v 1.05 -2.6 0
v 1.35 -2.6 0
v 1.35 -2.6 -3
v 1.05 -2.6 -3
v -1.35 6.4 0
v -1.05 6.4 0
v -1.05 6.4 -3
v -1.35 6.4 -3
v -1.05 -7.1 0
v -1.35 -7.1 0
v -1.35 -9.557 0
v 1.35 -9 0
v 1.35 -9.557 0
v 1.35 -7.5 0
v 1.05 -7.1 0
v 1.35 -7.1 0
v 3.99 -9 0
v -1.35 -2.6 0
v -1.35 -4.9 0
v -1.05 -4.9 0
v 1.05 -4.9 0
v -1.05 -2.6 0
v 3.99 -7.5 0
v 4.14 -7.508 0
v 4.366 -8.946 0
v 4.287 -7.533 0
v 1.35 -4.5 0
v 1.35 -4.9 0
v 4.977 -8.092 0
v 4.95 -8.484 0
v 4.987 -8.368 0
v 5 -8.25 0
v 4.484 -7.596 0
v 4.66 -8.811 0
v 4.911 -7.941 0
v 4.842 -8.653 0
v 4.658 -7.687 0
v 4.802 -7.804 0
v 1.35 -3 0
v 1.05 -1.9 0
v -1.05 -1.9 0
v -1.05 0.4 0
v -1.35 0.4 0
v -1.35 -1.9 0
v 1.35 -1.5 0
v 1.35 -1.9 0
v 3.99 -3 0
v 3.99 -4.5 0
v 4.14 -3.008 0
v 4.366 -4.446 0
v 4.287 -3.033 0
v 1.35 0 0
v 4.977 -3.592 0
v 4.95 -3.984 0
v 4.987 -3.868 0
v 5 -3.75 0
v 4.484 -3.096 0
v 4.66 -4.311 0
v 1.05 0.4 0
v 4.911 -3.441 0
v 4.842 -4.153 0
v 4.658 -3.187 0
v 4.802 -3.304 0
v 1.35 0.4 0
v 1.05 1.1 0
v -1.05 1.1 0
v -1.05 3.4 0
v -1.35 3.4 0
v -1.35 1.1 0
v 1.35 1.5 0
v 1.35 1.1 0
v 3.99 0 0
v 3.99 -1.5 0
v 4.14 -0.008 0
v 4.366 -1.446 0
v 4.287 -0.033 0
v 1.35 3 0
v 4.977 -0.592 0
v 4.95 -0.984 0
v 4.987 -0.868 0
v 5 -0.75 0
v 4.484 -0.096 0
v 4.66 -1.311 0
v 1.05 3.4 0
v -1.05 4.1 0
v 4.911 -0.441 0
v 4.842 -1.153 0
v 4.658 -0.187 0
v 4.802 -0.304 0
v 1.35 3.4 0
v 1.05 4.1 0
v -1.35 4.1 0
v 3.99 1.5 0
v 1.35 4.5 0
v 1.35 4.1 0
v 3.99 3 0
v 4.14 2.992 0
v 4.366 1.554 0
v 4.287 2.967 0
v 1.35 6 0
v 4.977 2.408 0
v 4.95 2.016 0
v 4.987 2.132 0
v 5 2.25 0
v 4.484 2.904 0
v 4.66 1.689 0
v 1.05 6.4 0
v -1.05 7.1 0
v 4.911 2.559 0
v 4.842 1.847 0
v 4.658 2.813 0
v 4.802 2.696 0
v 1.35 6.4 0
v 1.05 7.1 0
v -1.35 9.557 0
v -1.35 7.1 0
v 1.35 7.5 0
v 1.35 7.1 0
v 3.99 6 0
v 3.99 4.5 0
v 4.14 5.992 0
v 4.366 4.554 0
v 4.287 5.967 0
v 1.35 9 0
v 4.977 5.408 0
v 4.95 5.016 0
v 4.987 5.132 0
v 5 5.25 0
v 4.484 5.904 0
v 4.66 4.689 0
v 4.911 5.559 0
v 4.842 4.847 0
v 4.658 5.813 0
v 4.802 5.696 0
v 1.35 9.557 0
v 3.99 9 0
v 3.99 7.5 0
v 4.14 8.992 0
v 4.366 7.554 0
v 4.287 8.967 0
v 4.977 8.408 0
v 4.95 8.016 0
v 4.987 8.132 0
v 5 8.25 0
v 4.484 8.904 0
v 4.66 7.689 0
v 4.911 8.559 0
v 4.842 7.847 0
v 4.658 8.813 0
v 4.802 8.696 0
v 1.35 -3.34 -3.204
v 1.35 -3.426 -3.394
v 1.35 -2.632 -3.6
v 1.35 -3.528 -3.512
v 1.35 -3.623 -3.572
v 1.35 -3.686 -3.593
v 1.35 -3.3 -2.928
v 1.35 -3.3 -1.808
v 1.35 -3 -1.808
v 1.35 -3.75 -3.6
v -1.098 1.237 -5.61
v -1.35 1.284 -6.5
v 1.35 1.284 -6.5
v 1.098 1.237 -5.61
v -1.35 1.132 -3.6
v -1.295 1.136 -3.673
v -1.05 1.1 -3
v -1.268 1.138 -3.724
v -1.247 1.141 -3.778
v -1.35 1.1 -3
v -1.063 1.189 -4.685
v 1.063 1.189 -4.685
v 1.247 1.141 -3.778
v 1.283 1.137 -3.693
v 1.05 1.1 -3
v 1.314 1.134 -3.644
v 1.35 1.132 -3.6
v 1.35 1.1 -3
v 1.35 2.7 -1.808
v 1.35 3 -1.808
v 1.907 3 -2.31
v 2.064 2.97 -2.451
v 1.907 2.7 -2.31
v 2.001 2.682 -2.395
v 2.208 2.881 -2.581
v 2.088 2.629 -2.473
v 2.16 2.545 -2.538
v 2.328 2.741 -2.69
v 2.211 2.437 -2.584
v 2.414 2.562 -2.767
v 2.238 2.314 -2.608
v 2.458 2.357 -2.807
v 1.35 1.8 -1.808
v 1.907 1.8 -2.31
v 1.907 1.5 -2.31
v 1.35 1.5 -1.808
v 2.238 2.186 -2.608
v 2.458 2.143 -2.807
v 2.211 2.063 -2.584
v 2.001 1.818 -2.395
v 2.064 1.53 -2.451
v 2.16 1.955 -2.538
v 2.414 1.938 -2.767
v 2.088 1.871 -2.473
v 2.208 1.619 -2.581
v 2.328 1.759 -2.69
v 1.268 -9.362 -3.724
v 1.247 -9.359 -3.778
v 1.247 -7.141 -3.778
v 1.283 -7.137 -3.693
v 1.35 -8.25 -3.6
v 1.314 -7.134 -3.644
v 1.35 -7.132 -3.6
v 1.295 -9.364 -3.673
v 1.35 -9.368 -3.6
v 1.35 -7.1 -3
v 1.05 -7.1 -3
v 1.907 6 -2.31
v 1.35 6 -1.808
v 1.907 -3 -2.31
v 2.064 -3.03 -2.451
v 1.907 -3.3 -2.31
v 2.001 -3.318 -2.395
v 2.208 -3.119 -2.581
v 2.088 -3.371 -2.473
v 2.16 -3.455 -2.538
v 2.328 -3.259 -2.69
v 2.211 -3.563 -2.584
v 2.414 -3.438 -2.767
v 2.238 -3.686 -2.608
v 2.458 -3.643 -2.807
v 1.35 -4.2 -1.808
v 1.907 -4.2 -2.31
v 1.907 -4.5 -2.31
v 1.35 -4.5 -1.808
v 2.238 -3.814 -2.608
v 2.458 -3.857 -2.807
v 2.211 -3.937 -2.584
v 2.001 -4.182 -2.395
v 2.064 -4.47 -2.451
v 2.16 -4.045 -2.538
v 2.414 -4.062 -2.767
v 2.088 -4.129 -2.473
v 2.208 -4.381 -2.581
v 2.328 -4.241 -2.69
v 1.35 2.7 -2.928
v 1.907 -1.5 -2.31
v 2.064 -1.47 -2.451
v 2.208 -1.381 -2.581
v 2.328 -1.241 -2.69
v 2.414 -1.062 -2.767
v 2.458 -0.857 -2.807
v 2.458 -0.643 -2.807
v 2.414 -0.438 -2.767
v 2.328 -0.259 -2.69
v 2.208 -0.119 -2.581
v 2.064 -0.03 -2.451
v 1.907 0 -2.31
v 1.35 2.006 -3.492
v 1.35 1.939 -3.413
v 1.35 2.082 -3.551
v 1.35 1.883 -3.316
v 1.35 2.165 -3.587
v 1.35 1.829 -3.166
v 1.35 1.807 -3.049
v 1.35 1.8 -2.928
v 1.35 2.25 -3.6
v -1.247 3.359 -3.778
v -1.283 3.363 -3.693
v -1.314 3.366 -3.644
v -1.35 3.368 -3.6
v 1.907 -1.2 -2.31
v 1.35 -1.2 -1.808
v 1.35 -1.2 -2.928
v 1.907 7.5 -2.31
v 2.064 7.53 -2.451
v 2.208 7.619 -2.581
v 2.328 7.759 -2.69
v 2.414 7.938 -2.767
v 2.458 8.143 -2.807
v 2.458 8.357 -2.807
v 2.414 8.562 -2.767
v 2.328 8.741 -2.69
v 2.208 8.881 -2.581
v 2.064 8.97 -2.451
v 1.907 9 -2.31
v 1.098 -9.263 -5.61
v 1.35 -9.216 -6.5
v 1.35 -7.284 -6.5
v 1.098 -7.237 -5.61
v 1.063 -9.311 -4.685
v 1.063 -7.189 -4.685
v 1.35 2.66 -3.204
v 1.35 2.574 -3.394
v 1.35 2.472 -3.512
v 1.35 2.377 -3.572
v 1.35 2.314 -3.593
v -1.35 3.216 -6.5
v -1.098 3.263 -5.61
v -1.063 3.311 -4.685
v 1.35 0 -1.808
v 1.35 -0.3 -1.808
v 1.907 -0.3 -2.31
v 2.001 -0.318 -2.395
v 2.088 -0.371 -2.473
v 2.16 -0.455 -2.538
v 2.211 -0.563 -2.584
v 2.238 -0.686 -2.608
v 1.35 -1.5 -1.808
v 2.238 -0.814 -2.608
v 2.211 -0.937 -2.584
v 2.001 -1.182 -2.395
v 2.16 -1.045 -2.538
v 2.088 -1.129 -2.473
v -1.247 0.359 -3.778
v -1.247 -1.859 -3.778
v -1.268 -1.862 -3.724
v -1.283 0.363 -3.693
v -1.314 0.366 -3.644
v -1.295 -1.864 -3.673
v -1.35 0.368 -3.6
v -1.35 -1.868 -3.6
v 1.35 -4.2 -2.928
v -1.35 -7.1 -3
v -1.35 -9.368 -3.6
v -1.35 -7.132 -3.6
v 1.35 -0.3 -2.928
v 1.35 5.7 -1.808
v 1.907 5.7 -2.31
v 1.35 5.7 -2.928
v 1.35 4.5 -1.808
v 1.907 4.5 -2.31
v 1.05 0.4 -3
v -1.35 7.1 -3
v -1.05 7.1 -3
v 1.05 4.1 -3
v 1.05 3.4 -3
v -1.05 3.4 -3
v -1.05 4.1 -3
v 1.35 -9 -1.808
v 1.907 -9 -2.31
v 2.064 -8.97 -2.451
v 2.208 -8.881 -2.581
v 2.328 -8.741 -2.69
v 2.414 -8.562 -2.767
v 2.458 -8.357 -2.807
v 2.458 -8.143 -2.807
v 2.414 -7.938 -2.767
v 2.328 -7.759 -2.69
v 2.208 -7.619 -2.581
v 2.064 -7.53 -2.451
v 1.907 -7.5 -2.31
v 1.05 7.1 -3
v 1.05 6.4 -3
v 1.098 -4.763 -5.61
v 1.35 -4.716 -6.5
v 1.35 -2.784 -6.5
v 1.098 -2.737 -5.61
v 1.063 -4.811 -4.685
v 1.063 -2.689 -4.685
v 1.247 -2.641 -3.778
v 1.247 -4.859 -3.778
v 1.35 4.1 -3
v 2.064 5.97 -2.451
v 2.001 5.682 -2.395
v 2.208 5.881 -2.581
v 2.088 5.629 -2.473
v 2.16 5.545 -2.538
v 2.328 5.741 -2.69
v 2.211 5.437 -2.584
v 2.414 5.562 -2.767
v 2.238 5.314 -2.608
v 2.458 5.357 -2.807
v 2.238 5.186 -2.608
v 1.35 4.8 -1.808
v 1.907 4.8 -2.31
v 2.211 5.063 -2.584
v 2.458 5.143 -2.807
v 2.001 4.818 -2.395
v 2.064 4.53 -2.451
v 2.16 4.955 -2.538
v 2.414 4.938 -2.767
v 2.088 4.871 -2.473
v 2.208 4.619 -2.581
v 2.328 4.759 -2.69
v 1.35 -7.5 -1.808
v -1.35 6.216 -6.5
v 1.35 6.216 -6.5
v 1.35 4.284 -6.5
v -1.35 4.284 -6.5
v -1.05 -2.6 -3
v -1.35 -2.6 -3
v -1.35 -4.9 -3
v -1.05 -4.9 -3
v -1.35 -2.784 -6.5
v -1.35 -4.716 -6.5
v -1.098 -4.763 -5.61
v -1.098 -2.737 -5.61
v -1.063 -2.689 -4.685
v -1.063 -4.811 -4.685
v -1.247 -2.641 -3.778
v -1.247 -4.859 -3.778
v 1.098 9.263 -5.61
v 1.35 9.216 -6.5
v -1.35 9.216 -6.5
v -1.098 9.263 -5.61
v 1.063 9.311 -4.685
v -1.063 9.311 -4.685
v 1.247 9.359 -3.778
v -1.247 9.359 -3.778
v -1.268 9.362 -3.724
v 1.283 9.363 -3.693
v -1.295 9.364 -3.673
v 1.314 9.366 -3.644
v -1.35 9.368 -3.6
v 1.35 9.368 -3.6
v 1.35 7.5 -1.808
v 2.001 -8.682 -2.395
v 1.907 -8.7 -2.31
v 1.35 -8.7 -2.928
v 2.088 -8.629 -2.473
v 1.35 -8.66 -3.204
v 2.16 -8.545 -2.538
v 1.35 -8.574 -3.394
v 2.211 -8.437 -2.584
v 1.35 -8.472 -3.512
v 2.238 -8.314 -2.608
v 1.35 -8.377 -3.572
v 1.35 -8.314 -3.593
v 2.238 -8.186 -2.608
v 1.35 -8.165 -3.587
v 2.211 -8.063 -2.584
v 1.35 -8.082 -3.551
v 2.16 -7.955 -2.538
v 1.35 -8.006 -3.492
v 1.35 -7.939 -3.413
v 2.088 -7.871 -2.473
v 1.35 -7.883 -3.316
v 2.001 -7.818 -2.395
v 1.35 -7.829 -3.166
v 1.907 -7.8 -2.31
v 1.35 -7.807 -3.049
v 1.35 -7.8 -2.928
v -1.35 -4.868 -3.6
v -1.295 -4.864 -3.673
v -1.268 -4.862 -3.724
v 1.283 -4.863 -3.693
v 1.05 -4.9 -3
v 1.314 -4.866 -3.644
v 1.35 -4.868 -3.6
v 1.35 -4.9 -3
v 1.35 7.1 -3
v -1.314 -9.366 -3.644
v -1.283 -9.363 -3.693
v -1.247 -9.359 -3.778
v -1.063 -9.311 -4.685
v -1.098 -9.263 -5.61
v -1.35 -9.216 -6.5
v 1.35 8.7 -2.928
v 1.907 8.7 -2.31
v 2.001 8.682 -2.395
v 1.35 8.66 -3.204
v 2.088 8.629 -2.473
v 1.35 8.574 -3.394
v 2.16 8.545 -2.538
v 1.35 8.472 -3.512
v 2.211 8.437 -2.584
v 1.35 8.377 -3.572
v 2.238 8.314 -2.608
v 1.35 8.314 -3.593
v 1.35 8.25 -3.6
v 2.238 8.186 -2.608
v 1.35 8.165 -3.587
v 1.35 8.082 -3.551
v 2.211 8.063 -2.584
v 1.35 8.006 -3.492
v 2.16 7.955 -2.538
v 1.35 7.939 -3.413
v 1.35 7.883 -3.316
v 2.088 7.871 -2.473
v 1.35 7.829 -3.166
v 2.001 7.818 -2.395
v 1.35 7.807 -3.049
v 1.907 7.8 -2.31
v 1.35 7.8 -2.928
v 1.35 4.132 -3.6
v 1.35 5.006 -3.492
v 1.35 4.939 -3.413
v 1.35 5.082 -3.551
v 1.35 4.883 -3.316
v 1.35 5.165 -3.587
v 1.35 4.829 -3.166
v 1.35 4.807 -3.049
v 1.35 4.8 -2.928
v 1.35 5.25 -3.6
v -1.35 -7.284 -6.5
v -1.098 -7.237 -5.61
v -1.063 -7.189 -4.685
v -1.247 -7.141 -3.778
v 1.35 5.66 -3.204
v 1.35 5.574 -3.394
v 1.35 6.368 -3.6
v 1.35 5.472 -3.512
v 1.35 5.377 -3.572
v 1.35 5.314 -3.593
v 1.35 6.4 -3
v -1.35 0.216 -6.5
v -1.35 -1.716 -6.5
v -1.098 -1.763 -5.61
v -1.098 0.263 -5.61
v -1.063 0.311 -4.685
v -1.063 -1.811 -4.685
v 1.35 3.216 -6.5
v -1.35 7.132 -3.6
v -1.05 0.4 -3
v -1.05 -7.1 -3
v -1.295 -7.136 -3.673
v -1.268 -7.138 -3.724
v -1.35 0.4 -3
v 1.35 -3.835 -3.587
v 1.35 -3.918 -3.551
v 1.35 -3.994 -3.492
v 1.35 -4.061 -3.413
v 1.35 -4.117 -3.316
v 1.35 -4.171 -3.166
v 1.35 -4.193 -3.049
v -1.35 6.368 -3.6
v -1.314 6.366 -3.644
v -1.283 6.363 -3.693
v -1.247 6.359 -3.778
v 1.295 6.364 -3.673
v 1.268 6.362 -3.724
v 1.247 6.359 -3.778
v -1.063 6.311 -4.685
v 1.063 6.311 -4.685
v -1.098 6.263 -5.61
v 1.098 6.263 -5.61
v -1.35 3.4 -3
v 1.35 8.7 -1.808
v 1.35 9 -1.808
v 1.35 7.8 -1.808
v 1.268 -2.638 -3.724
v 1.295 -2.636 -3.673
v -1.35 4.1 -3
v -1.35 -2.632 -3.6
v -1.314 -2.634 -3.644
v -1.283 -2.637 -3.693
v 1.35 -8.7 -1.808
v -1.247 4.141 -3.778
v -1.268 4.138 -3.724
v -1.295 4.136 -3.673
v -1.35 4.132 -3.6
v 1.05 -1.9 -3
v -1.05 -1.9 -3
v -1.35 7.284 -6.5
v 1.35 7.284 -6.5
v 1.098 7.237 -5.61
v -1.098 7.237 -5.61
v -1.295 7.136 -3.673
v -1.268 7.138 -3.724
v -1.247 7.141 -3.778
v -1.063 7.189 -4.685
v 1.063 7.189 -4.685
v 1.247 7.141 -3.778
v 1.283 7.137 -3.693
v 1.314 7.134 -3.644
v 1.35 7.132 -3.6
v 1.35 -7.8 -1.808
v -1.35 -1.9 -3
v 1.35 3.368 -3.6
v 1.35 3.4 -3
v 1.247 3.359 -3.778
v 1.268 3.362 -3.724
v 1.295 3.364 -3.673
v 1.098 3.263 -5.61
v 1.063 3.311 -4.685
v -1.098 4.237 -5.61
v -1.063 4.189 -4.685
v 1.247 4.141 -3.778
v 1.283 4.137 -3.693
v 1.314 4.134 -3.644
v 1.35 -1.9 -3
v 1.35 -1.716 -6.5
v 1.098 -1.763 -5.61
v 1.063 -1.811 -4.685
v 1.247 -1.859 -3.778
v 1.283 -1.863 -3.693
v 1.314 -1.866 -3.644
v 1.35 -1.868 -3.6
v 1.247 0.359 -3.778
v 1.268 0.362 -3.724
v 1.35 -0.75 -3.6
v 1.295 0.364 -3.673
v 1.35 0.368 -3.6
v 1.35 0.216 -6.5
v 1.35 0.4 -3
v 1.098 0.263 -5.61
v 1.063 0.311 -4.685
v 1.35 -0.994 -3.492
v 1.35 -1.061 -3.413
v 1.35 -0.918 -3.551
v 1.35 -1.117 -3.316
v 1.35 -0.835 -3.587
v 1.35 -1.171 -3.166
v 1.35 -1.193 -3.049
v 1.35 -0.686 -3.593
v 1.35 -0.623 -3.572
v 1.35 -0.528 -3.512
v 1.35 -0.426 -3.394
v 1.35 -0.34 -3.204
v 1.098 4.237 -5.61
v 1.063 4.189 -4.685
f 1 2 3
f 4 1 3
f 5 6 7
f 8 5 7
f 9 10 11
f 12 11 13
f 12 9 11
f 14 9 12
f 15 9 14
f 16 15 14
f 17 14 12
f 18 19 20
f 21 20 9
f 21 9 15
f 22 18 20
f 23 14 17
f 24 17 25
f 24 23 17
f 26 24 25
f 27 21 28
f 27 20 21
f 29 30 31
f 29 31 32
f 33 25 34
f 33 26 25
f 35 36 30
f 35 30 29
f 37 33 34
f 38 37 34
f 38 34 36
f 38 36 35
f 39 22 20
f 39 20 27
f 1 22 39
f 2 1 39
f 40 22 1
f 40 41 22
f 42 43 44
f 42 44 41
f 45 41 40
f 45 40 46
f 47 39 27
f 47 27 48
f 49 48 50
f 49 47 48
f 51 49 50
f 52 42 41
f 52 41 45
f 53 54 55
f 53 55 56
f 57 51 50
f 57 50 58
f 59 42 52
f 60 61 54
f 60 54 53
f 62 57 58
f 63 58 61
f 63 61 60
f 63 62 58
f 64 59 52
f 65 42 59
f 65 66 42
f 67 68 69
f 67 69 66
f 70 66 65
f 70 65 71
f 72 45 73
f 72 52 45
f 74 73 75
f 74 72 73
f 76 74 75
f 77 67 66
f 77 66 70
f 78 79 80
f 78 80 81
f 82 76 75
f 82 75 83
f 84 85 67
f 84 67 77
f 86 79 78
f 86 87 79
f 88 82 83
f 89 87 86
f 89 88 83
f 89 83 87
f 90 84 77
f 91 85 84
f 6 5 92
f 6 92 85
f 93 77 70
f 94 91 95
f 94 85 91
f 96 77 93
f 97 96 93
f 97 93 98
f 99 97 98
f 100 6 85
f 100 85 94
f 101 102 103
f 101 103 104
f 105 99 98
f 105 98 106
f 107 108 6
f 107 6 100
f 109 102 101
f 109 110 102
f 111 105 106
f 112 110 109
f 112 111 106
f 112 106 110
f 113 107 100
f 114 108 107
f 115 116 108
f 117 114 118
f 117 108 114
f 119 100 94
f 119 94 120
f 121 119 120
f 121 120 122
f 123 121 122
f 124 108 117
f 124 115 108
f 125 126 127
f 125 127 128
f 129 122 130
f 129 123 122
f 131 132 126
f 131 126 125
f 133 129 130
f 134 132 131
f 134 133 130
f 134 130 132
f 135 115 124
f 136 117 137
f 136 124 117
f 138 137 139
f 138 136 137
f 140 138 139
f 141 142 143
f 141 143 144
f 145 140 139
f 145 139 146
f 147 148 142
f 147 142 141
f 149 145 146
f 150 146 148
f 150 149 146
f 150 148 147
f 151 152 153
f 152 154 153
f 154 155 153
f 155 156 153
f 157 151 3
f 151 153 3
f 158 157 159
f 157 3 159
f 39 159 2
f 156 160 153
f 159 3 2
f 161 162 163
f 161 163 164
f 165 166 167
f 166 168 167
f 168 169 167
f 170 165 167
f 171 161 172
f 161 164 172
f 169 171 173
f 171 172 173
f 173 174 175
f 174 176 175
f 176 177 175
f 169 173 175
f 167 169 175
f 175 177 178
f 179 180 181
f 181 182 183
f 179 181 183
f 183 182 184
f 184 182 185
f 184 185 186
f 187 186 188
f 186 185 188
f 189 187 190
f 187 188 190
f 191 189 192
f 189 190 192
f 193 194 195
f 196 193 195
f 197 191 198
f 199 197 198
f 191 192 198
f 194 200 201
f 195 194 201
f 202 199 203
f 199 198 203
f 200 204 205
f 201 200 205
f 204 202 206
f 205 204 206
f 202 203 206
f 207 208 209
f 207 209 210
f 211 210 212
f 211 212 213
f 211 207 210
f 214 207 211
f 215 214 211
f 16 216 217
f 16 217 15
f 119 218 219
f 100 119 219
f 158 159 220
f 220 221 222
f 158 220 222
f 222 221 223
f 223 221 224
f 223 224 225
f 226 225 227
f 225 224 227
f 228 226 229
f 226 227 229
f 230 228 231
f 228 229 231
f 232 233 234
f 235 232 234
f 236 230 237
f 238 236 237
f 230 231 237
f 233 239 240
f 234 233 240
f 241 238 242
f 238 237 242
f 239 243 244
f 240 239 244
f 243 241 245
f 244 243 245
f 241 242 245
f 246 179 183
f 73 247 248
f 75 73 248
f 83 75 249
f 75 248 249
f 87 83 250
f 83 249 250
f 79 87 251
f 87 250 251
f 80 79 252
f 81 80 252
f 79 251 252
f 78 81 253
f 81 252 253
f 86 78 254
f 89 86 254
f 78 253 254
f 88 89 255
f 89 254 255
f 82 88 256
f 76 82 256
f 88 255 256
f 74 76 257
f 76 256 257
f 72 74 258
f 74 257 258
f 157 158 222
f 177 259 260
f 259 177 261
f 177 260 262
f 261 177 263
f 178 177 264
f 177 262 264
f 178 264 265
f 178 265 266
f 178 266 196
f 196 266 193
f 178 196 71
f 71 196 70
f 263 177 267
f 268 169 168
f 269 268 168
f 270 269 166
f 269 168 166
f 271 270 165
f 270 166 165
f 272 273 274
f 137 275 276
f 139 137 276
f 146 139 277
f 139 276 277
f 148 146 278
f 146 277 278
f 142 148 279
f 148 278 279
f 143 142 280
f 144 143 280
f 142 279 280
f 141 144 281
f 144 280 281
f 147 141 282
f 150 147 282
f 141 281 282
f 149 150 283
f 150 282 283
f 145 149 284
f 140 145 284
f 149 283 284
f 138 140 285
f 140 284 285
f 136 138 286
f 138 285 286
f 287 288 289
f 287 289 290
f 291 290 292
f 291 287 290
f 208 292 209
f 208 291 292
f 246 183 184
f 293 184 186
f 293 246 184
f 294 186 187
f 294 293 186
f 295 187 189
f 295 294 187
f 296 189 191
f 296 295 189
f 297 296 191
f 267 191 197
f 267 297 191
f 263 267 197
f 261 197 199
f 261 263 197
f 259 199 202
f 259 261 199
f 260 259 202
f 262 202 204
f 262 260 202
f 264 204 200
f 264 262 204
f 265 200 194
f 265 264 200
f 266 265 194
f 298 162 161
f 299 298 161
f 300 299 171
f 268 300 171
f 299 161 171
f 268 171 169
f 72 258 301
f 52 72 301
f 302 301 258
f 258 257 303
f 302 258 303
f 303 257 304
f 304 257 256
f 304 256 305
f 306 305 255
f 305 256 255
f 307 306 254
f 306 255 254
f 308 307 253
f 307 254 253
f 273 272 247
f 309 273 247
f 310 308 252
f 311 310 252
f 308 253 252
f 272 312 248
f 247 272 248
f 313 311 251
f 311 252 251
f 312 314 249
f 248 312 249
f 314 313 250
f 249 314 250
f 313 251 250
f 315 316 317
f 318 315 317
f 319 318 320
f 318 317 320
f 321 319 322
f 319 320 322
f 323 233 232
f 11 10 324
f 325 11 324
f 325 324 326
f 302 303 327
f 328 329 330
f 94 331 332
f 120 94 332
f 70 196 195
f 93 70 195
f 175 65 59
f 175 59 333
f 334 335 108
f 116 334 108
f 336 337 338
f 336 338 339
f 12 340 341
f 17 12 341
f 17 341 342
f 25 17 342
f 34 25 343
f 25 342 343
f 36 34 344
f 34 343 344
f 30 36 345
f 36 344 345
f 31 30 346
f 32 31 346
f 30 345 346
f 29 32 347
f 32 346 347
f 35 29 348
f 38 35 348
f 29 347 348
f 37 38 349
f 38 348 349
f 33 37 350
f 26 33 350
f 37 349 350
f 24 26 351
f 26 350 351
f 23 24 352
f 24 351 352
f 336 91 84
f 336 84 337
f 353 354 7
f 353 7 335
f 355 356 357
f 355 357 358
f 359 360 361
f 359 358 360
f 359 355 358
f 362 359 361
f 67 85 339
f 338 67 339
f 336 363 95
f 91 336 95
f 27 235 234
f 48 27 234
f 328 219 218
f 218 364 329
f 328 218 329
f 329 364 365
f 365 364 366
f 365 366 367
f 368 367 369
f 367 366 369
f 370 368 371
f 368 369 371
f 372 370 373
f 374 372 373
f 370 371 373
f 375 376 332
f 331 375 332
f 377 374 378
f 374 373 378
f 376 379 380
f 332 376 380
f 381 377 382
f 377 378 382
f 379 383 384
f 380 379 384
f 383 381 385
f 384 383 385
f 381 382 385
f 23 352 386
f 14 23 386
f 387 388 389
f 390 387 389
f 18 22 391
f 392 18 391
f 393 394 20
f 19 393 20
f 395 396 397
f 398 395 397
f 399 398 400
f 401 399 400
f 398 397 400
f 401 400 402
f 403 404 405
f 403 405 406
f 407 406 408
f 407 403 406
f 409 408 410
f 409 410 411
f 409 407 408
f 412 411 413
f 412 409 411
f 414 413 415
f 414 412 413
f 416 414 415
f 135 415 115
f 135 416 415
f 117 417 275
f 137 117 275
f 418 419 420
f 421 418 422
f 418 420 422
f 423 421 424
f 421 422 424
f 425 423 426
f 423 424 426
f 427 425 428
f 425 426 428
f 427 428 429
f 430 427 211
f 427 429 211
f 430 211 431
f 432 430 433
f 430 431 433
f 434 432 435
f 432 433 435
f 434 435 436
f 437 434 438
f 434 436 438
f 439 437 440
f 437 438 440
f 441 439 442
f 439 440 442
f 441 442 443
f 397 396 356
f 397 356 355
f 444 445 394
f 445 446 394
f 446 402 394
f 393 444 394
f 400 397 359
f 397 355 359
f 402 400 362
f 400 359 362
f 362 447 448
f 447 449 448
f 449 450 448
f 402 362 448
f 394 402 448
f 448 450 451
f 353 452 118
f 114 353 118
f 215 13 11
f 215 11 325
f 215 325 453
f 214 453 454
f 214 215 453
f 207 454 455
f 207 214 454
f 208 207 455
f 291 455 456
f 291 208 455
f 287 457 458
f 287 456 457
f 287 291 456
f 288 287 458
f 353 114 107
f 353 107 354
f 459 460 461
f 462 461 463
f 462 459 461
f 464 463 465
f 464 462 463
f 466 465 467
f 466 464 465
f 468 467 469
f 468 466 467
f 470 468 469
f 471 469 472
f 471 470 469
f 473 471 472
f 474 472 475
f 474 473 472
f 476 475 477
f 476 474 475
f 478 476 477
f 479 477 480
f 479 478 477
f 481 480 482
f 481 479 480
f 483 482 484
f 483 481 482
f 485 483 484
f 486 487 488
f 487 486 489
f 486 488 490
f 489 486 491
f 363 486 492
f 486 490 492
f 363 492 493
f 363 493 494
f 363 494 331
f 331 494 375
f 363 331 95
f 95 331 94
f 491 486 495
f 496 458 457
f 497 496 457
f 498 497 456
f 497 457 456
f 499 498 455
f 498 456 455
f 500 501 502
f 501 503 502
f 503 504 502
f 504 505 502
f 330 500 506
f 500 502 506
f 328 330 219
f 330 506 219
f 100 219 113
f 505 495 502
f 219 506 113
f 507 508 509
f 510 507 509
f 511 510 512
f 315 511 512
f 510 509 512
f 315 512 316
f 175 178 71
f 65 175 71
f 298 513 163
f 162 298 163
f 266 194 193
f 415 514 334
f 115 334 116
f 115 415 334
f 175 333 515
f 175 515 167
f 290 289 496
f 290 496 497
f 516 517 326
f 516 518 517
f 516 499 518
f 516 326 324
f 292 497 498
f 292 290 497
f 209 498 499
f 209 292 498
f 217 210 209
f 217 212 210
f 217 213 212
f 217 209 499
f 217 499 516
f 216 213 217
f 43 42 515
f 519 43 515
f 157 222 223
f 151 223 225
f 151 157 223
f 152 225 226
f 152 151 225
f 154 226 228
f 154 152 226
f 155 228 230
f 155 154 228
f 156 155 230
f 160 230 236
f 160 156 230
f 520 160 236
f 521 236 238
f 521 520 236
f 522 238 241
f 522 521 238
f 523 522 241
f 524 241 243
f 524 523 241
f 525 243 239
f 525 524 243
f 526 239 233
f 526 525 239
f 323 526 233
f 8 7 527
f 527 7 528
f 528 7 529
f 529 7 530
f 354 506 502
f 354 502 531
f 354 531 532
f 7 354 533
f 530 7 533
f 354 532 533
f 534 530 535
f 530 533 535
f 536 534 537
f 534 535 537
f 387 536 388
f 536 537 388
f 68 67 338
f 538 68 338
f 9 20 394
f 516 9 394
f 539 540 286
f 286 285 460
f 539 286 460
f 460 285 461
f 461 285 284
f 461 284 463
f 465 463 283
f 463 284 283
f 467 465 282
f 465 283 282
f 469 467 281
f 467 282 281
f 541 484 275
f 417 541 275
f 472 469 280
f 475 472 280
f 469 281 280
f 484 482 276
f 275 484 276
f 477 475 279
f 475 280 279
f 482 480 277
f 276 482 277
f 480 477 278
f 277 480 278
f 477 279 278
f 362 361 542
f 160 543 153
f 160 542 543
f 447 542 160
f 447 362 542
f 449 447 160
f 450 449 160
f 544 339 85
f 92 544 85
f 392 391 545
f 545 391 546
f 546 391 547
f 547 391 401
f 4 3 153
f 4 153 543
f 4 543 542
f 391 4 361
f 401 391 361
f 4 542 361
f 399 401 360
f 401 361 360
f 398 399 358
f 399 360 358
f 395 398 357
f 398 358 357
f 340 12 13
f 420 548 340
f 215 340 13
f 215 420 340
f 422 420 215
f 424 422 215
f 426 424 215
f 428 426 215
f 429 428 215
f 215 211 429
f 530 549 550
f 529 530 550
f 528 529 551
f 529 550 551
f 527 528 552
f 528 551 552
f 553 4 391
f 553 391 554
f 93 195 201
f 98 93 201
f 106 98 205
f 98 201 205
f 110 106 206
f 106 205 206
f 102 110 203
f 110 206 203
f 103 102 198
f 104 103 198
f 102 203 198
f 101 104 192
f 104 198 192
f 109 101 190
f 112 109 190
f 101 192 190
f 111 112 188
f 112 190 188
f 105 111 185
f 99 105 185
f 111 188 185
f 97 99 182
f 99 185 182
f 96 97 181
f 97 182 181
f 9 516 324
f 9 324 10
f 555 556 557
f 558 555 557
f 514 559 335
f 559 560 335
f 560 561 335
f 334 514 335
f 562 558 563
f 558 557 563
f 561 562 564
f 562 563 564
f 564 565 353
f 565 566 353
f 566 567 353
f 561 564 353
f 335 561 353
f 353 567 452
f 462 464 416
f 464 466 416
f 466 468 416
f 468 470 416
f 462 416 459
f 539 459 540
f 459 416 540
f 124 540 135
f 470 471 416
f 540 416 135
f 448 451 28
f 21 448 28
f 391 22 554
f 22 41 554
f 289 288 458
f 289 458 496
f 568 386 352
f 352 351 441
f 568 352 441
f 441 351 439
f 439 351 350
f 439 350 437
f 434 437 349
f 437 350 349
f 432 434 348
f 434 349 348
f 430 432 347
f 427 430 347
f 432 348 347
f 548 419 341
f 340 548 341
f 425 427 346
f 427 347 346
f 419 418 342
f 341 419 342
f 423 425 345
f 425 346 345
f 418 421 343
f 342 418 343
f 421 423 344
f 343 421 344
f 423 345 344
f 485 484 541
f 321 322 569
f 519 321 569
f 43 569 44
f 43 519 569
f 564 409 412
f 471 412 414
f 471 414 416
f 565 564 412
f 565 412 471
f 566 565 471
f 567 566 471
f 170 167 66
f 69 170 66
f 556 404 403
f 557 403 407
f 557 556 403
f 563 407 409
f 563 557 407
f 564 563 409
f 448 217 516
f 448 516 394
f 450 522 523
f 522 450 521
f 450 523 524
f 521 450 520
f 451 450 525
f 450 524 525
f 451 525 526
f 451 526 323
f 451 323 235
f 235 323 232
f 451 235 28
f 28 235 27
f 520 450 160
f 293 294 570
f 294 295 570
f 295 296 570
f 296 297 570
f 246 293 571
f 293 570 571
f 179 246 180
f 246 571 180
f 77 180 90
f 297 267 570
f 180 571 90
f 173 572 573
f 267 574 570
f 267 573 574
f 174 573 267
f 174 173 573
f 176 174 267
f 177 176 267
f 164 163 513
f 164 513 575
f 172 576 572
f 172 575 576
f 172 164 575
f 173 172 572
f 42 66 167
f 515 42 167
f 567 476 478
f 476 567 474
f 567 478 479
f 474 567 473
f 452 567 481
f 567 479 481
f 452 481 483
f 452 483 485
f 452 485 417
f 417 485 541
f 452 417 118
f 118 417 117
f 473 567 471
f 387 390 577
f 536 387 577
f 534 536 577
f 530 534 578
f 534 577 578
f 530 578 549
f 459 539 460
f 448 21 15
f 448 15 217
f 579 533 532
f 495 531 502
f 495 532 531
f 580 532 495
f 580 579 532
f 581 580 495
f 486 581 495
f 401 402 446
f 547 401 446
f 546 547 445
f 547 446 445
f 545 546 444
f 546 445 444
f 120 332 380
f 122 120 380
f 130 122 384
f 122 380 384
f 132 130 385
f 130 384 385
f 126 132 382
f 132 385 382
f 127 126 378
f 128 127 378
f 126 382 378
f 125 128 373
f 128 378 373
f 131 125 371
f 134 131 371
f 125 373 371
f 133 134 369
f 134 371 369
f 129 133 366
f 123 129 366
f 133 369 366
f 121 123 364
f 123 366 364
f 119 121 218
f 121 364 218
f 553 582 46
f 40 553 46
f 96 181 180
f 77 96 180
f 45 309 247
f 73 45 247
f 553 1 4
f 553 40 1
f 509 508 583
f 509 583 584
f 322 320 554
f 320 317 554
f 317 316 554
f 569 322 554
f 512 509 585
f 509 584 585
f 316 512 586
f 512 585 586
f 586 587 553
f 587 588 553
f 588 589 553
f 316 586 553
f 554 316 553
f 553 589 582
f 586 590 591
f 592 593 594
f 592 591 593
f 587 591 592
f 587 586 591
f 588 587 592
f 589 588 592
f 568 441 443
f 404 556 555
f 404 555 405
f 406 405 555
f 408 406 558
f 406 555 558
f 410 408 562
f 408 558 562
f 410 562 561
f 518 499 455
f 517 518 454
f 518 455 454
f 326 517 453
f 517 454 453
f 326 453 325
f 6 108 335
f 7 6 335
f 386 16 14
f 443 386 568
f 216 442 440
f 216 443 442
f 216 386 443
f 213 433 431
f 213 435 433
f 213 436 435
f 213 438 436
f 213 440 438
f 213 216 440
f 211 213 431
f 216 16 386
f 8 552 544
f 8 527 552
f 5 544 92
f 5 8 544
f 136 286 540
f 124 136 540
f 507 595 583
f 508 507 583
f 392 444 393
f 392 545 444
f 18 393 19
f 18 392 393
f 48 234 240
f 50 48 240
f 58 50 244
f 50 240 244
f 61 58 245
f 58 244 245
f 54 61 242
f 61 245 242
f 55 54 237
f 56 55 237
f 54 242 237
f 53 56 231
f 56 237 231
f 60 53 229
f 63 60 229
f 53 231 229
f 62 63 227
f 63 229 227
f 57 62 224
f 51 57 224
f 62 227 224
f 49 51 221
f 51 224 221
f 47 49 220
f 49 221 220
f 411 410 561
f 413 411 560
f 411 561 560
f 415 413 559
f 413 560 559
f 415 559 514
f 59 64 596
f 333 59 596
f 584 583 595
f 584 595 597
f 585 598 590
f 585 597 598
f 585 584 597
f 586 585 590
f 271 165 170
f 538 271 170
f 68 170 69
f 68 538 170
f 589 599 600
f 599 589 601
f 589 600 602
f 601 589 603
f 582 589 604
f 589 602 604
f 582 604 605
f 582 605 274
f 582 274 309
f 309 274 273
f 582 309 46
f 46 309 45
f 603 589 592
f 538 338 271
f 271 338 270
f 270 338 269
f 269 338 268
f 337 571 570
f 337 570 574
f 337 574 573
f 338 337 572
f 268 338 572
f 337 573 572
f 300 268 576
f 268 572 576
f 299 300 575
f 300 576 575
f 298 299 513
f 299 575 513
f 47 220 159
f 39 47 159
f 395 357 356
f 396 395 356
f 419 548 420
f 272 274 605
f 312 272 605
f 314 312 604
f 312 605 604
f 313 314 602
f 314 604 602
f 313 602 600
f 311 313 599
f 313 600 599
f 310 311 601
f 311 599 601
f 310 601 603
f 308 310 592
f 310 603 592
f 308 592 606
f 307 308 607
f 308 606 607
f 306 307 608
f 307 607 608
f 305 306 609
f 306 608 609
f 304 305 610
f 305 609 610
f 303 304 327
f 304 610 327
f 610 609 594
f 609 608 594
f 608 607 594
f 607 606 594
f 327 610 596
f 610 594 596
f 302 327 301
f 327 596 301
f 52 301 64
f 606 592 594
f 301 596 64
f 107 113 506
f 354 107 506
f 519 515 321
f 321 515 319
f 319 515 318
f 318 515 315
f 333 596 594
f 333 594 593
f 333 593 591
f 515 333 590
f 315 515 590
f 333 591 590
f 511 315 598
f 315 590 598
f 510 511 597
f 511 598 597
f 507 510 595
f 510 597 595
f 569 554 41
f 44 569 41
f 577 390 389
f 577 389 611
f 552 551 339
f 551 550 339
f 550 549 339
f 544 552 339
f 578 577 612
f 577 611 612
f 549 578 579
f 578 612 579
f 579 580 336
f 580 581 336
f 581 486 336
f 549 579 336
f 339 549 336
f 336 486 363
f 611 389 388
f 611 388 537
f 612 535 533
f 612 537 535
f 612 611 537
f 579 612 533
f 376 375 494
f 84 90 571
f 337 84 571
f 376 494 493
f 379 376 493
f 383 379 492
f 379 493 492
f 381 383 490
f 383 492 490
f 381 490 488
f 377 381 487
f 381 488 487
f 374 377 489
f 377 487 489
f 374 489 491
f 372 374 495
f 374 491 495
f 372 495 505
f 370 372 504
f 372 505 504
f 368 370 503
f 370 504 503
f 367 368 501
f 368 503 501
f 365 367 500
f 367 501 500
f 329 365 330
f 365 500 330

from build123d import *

# Parameters (mm, degrees)
SKETCH1_W           = 15
SKETCH1_H           = 30
BOSS_EXTRUDE1_DEPTH = 7
CUT_EXTRUDE1_START  = -0.3
CUT_EXTRUDE1_DEPTH  = 2.1
CUT_EXTRUDE4_DEPTH  = 2.7
BOSS_EXTRUDE2_DEPTH = 24.556743
CUT_EXTRUDE2_DEPTH  = 27.627139608
CUT_EXTRUDE3_DEPTH  = 27.401285317
SKETCH13_W          = 10
SKETCH13_H          = 20
BOSS_EXTRUDE3_DEPTH = 7
SKETCH14_W          = 3.65
SKETCH14_H          = 19.113486034
CUT_EXTRUDE5_DEPTH  = 13.592908206


with BuildPart() as part:
    # Sketch1 → Boss-Extrude1 (new body)
    with BuildSketch(Plane.XY):
        Rectangle(SKETCH1_W, SKETCH1_H)
    extrude(amount=-BOSS_EXTRUDE1_DEPTH)

    # Sketch8 → Cut-Extrude1 (cut)
    with BuildSketch(Plane(origin=(1.35, 0, 0), x_dir=(0, 0, -1), z_dir=(1, 0, 0)).offset(CUT_EXTRUDE1_START)):
        Polygon((6.5, -4.716092451), (6.5, -2.783907549), (3, -2.600480321), (3, -1.899519679), (6.5, -1.716092451), (6.5, 0.216092451), (3, 0.399519679), (3, 1.100480321), (6.5, 1.283907549), (6.5, 3.216092451), (3, 3.399519679), (3, 4.100480321), (6.5, 4.283907549), (6.5, 6.216092451), (3, 6.399519679), (3, 7.100480321), (6.5, 7.283907549), (6.5, 9.216092451), (0, 9.556743017), (0, -9.556743017), (6.5, -9.216092451), (6.5, -7.283907549), (3, -7.100480321), (3, -4.899519679), align=None)
    extrude(amount=-CUT_EXTRUDE1_DEPTH, mode=Mode.SUBTRACT)

    # Sketch7 → Cut-Extrude4 (cut)
    with BuildSketch(Plane(origin=(1.35, 0, 0), x_dir=(0, 0, -1), z_dir=(1, 0, 0))):
        Polygon((3, 4.100480321), (0, 4.100480321), (0, 6.399519679), (3, 6.399519679), (6.5, 6.216092451), (6.5, 4.283907549), align=None)
        Polygon((3, 1.100480321), (0, 1.100480321), (0, 3.399519679), (3, 3.399519679), (6.5, 3.216092451), (6.5, 1.283907549), align=None)
        Polygon((3, -1.899519679), (0, -1.899519679), (0, 0.399519679), (3, 0.399519679), (6.5, 0.216092451), (6.5, -1.716092451), align=None)
        Polygon((3, -4.899519679), (0, -4.899519679), (0, -2.600480321), (3, -2.600480321), (6.5, -2.783907549), (6.5, -4.716092451), align=None)
        Polygon((3, -7.100480321), (0, -7.100480321), (0, -9.556743017), (6.5, -9.216092451), (6.5, -7.283907549), align=None)
        Polygon((3, 7.100480321), (0, 7.100480321), (0, 9.556743017), (6.5, 9.216092451), (6.5, 7.283907549), align=None)
    extrude(amount=-CUT_EXTRUDE4_DEPTH, mode=Mode.SUBTRACT)

    # Sketch10 → Boss-Extrude2 (add)
    with BuildSketch(Plane(origin=(0, -9.556743017, 0), x_dir=(1, 0, 0), z_dir=(0, 1, 0))):
        with BuildLine():
            Line((1.35, 3.599507213), (1.35, 6.5))
            ThreePointArc((1.35, 6.5), (1.052815056, 5.148153684), (1.246508191, 3.777646361))
            ThreePointArc((1.246508191, 3.777646361), (1.288979573, 3.683188656), (1.35, 3.599507213))
        make_face()
        with BuildLine():
            Line((-1.35, 3.599507213), (-1.35, 6.5))
            ThreePointArc((-1.35, 6.5), (-1.052815056, 5.148153684), (-1.246508191, 3.777646361))
            ThreePointArc((-1.246508191, 3.777646361), (-1.288979573, 3.683188656), (-1.35, 3.599507213))
        make_face()
    extrude(amount=BOSS_EXTRUDE2_DEPTH)

    # Sketch12 → Cut-Extrude2 (cut, through all)
    with BuildSketch(Plane(origin=(3.10411931, 9.156194078, -3.38952842), x_dir=(0, -1, 0), z_dir=(0.669702306213578, 0, 0.7426296661541438))):
        with BuildLine():
            Line((0.156194078, -1.612037756), (0.156194078, -5.06124645))
            Line((0.156194078, -5.06124645), (1.656194078, -5.06124645))
            Line((1.656194078, -5.06124645), (1.656194078, -1.612037756))
            ThreePointArc((1.656194078, -1.612037756), (0.906194078, -0.862037756), (0.156194078, -1.612037756))
        make_face()
        with BuildLine():
            Line((3.156194078, -1.612037756), (3.156194078, -5.06124645))
            Line((3.156194078, -5.06124645), (4.656194078, -5.06124645))
            Line((4.656194078, -5.06124645), (4.656194078, -1.612037756))
            ThreePointArc((4.656194078, -1.612037756), (3.906194078, -0.862037756), (3.156194078, -1.612037756))
        make_face()
        with BuildLine():
            Line((6.156194078, -1.612037756), (6.156194078, -5.06124645))
            Line((6.156194078, -5.06124645), (7.656194078, -5.06124645))
            Line((7.656194078, -5.06124645), (7.656194078, -1.612037756))
            ThreePointArc((7.656194078, -1.612037756), (6.906194078, -0.862037756), (6.156194078, -1.612037756))
        make_face()
        with BuildLine():
            Line((9.156194078, -1.612037756), (9.156194078, -5.06124645))
            Line((9.156194078, -5.06124645), (10.656194078, -5.06124645))
            Line((10.656194078, -5.06124645), (10.656194078, -1.612037756))
            ThreePointArc((10.656194078, -1.612037756), (9.906194078, -0.862037756), (9.156194078, -1.612037756))
        make_face()
        with BuildLine():
            Line((12.156194078, -1.612037756), (12.156194078, -5.06124645))
            Line((12.156194078, -5.06124645), (13.656194078, -5.06124645))
            Line((13.656194078, -5.06124645), (13.656194078, -1.612037756))
            ThreePointArc((13.656194078, -1.612037756), (12.906194078, -0.862037756), (12.156194078, -1.612037756))
        make_face()
        with BuildLine():
            Line((16.656194078, -1.612037756), (16.656194078, -5.06124645))
            Line((16.656194078, -5.06124645), (18.156194078, -5.06124645))
            Line((18.156194078, -5.06124645), (18.156194078, -1.612037756))
            ThreePointArc((18.156194078, -1.612037756), (17.406194078, -0.862037756), (16.656194078, -1.612037756))
        make_face()
    cut_extrude2 = extrude(amount=CUT_EXTRUDE2_DEPTH, mode=Mode.SUBTRACT)

    # Sketch11 → Cut-Extrude3 (cut, through all)
    with BuildSketch(Plane(origin=(2.212963711, 9.156194078, -4.377726578), x_dir=(0, -1, 0), z_dir=(0.6697023062135781, 0, 0.7426296661541438))):
        with BuildLine():
            Line((0.456194078, -2.362037756), (0.456194078, -1.612037756))
            ThreePointArc((0.456194078, -1.612037756), (0.906194078, -1.162037756), (1.356194078, -1.612037756))
            Line((1.356194078, -1.612037756), (1.356194078, -2.362037756))
            Line((1.356194078, -2.362037756), (0.456194078, -2.362037756))
        make_face()
        with BuildLine():
            Line((3.456194078, -1.612037756), (3.456194078, -2.362037756))
            Line((3.456194078, -2.362037756), (4.356194078, -2.362037756))
            Line((4.356194078, -2.362037756), (4.356194078, -1.612037756))
            ThreePointArc((4.356194078, -1.612037756), (3.906194078, -1.162037756), (3.456194078, -1.612037756))
        make_face()
        with BuildLine():
            Line((7.356194078, -1.612037756), (7.356194078, -2.362037756))
            Line((7.356194078, -2.362037756), (6.456194078, -2.362037756))
            Line((6.456194078, -2.362037756), (6.456194078, -1.612037756))
            ThreePointArc((6.456194078, -1.612037756), (6.906194078, -1.162037756), (7.356194078, -1.612037756))
        make_face()
        with BuildLine():
            Line((9.456194078, -1.612037756), (9.456194078, -2.362037756))
            Line((9.456194078, -2.362037756), (10.356194078, -2.362037756))
            Line((10.356194078, -2.362037756), (10.356194078, -1.612037756))
            ThreePointArc((10.356194078, -1.612037756), (9.906194078, -1.162037756), (9.456194078, -1.612037756))
        make_face()
        with BuildLine():
            Line((13.356194078, -1.612037756), (13.356194078, -2.362037756))
            Line((13.356194078, -2.362037756), (12.456194078, -2.362037756))
            Line((12.456194078, -2.362037756), (12.456194078, -1.612037756))
            ThreePointArc((12.456194078, -1.612037756), (12.906194078, -1.162037756), (13.356194078, -1.612037756))
        make_face()
        with BuildLine():
            Line((16.956194078, -1.612037756), (16.956194078, -2.362037756))
            Line((16.956194078, -2.362037756), (17.856194078, -2.362037756))
            Line((17.856194078, -2.362037756), (17.856194078, -1.612037756))
            ThreePointArc((17.856194078, -1.612037756), (17.406194078, -1.162037756), (16.956194078, -1.612037756))
        make_face()
    cut_extrude3 = extrude(amount=CUT_EXTRUDE3_DEPTH, mode=Mode.SUBTRACT)

    # Mirror1: Cut-Extrude2, Cut-Extrude3 across plane
    add(cut_extrude2.mirror(Plane(origin=(0, 0, 0), x_dir=(0, 0, 1), z_dir=(1, 0, 0))), mode=Mode.SUBTRACT)
    add(cut_extrude3.mirror(Plane(origin=(0, 0, 0), x_dir=(0, 0, 1), z_dir=(1, 0, 0))), mode=Mode.SUBTRACT)


with BuildPart() as body_2:
    # Sketch13 → Boss-Extrude3 (new body)
    with BuildSketch(Plane.XY):
        Rectangle(SKETCH13_W, SKETCH13_H)
    extrude(amount=-BOSS_EXTRUDE3_DEPTH)

    # Combine1: cut part
    add(part.part, mode=Mode.SUBTRACT)

    # Sketch14 → Cut-Extrude5 (cut, through all)
    with BuildSketch(Plane.XY):
        with Locations((-3.175, 0)):
            Rectangle(SKETCH14_W, SKETCH14_H)
    extrude(amount=-CUT_EXTRUDE5_DEPTH, mode=Mode.SUBTRACT)


solid = body_2.part
